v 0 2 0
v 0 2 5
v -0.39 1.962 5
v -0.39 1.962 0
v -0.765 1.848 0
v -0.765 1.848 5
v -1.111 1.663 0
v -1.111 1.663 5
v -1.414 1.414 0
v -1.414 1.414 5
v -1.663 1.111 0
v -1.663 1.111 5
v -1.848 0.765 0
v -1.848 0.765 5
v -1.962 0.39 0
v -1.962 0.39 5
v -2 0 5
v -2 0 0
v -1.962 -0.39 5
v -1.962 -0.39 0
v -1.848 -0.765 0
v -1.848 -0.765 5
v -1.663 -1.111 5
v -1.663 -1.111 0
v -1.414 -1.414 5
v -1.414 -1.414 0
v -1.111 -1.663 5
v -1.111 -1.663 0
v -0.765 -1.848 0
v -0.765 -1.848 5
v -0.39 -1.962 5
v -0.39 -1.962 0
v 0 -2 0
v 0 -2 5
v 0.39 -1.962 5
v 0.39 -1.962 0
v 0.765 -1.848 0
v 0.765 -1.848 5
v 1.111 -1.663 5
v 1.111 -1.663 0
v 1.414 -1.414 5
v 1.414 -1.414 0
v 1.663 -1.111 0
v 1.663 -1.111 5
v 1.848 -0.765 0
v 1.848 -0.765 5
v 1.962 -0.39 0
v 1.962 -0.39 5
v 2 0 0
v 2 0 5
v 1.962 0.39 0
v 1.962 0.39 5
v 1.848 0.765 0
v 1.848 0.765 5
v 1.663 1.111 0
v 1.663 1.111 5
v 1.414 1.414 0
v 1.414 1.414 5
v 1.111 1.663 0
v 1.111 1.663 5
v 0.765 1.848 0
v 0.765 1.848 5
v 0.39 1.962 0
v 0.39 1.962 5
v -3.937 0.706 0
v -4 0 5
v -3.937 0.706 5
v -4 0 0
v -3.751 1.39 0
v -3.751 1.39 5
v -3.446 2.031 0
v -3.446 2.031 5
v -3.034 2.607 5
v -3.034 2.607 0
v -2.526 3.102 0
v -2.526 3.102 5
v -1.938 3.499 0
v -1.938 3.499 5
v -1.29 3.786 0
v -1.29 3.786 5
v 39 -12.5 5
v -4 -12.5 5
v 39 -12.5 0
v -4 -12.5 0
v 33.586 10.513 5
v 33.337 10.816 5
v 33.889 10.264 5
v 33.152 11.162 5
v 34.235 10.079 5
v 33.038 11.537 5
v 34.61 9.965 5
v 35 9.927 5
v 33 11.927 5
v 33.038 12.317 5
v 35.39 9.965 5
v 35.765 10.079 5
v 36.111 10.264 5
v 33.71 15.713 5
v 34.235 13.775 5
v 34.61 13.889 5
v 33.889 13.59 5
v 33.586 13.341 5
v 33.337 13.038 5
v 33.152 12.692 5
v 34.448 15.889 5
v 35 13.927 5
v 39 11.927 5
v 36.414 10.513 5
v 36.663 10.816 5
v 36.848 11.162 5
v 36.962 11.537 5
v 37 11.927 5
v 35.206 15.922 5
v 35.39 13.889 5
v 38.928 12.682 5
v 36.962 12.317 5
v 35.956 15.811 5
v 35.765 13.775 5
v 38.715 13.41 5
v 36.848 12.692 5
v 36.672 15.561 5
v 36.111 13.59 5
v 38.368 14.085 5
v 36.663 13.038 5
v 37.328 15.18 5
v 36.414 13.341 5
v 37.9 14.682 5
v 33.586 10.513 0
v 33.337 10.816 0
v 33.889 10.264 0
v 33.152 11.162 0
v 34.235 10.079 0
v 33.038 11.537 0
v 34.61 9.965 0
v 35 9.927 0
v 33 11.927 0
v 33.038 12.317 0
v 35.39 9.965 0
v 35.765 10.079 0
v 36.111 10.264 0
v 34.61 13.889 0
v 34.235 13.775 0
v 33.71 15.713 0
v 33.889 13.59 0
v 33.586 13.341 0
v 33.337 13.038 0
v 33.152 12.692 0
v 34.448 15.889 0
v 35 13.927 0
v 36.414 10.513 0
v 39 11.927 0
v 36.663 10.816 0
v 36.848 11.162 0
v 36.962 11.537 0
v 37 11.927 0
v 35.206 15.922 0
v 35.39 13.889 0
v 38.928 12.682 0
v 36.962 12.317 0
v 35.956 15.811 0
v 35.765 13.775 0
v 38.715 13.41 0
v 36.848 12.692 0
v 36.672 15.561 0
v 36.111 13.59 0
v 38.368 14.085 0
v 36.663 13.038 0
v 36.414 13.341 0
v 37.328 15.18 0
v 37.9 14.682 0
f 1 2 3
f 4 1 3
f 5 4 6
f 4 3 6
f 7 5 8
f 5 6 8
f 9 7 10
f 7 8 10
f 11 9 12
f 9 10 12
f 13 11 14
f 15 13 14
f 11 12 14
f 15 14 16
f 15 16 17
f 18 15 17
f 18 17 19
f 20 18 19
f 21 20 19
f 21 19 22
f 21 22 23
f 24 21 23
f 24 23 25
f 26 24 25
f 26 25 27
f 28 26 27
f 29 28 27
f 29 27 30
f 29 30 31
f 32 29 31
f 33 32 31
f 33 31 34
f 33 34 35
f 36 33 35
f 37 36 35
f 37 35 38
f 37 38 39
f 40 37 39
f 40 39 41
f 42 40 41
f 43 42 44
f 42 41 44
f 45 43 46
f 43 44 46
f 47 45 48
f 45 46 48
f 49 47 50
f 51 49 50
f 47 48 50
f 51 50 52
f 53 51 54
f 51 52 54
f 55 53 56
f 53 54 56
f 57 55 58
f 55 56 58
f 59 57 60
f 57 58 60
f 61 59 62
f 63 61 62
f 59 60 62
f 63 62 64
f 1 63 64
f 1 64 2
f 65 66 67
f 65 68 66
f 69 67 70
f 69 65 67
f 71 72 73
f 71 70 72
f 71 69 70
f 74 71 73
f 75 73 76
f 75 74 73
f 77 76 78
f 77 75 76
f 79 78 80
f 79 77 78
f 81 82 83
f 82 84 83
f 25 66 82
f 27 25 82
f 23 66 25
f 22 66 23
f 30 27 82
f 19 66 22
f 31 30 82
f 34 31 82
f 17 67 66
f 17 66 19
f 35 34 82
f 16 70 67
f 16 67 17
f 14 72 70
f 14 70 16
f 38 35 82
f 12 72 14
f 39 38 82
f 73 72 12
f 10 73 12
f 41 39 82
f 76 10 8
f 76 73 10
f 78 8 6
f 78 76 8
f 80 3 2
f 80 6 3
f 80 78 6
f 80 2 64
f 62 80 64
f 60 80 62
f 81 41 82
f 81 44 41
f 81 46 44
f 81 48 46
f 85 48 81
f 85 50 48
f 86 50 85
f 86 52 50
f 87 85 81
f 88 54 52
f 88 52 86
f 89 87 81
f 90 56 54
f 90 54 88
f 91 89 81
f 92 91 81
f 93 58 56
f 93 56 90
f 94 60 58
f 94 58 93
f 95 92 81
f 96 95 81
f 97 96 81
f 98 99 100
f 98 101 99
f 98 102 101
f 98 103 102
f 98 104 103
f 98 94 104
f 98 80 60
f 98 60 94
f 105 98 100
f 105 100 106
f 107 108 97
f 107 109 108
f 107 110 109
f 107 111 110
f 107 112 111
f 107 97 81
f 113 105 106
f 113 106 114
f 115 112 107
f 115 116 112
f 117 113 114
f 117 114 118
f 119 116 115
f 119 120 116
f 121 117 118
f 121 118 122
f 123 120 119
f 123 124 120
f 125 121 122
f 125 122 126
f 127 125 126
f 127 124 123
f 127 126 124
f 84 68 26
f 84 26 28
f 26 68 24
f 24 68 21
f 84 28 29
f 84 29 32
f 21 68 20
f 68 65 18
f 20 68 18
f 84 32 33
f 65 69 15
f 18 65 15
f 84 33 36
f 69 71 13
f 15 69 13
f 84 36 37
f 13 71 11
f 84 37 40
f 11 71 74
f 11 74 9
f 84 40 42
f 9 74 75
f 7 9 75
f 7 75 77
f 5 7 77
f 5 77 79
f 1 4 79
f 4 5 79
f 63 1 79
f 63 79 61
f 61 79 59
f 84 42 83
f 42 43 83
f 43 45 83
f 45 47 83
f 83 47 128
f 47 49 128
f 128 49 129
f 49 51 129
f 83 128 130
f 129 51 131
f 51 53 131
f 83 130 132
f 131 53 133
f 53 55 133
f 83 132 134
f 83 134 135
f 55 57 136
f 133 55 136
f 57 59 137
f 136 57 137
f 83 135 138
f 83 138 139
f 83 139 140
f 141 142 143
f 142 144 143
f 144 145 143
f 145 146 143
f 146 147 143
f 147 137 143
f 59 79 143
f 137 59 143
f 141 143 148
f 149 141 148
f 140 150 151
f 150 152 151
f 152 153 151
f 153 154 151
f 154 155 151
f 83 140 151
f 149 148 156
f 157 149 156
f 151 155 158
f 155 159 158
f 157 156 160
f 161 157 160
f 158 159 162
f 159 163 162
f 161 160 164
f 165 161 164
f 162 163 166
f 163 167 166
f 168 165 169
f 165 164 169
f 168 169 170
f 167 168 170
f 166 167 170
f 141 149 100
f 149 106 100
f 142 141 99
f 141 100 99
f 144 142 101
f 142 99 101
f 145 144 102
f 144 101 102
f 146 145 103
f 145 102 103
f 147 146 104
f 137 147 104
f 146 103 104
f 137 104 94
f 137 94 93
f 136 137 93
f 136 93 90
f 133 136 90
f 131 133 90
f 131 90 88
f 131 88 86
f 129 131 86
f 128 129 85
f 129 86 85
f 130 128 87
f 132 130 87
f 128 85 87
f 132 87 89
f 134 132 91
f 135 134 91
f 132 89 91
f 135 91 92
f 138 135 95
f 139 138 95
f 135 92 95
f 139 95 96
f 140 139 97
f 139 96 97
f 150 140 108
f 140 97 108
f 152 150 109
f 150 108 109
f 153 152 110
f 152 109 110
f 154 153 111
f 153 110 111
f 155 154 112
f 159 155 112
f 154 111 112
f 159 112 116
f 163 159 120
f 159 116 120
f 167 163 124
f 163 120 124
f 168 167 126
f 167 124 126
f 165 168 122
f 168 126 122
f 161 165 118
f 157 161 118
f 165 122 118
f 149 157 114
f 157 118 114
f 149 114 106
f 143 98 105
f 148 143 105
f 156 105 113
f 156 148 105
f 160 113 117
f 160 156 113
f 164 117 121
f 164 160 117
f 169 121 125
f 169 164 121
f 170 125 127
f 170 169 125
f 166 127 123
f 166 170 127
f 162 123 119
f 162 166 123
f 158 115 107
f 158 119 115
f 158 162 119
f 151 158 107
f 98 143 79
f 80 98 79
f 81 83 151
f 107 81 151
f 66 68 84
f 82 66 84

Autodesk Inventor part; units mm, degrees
ref_plane "YZ Plane" through (0, 0, 0) normal (1, 0, 0) x (0, 1, 0)
ref_plane "XZ Plane" through (0, 0, 0) normal (0, 1, 0) x (-1, 0, 0)
ref_plane "XY Plane" through (0, 0, 0) normal (0, 0, 1) x (1, 0, 0)
sketch "スケッチ1" plane through (0, 0, 0) normal (0, 0, 1) x (1, 0, 0)
  line L0 (0, 0) -> (35, 11.927) construction
  line L1 (33.7098, 15.7132) -> (-1.2902, 3.7862)
  line L2 (-4, 0) -> (-4, -12.5)
  line L3 (-4, -12.5) -> (39, -12.5)
  line L4 (39, -12.5) -> (39, 11.927)
  arc A0 (-1.2902, 3.7862) -> (-4, 0) centre (0, 0) ccw
  arc A1 (39, 11.927) -> (33.7098, 15.7132) centre (35, 11.927) ccw
  dimension "d0" = 35
  dimension "d1" = 11.927
  dimension "d2" = 4
  dimension "d12" = 12.5
extrude "押し出し1" add sketch "スケッチ1" along normal blind 5
hole "穴1" at (0, 0, 0) at (35, 11.927, 0) direction (0, 0, 1) diameter 4 end through all
properties part number "COXA_ROLL_COUPLER_BACK"
